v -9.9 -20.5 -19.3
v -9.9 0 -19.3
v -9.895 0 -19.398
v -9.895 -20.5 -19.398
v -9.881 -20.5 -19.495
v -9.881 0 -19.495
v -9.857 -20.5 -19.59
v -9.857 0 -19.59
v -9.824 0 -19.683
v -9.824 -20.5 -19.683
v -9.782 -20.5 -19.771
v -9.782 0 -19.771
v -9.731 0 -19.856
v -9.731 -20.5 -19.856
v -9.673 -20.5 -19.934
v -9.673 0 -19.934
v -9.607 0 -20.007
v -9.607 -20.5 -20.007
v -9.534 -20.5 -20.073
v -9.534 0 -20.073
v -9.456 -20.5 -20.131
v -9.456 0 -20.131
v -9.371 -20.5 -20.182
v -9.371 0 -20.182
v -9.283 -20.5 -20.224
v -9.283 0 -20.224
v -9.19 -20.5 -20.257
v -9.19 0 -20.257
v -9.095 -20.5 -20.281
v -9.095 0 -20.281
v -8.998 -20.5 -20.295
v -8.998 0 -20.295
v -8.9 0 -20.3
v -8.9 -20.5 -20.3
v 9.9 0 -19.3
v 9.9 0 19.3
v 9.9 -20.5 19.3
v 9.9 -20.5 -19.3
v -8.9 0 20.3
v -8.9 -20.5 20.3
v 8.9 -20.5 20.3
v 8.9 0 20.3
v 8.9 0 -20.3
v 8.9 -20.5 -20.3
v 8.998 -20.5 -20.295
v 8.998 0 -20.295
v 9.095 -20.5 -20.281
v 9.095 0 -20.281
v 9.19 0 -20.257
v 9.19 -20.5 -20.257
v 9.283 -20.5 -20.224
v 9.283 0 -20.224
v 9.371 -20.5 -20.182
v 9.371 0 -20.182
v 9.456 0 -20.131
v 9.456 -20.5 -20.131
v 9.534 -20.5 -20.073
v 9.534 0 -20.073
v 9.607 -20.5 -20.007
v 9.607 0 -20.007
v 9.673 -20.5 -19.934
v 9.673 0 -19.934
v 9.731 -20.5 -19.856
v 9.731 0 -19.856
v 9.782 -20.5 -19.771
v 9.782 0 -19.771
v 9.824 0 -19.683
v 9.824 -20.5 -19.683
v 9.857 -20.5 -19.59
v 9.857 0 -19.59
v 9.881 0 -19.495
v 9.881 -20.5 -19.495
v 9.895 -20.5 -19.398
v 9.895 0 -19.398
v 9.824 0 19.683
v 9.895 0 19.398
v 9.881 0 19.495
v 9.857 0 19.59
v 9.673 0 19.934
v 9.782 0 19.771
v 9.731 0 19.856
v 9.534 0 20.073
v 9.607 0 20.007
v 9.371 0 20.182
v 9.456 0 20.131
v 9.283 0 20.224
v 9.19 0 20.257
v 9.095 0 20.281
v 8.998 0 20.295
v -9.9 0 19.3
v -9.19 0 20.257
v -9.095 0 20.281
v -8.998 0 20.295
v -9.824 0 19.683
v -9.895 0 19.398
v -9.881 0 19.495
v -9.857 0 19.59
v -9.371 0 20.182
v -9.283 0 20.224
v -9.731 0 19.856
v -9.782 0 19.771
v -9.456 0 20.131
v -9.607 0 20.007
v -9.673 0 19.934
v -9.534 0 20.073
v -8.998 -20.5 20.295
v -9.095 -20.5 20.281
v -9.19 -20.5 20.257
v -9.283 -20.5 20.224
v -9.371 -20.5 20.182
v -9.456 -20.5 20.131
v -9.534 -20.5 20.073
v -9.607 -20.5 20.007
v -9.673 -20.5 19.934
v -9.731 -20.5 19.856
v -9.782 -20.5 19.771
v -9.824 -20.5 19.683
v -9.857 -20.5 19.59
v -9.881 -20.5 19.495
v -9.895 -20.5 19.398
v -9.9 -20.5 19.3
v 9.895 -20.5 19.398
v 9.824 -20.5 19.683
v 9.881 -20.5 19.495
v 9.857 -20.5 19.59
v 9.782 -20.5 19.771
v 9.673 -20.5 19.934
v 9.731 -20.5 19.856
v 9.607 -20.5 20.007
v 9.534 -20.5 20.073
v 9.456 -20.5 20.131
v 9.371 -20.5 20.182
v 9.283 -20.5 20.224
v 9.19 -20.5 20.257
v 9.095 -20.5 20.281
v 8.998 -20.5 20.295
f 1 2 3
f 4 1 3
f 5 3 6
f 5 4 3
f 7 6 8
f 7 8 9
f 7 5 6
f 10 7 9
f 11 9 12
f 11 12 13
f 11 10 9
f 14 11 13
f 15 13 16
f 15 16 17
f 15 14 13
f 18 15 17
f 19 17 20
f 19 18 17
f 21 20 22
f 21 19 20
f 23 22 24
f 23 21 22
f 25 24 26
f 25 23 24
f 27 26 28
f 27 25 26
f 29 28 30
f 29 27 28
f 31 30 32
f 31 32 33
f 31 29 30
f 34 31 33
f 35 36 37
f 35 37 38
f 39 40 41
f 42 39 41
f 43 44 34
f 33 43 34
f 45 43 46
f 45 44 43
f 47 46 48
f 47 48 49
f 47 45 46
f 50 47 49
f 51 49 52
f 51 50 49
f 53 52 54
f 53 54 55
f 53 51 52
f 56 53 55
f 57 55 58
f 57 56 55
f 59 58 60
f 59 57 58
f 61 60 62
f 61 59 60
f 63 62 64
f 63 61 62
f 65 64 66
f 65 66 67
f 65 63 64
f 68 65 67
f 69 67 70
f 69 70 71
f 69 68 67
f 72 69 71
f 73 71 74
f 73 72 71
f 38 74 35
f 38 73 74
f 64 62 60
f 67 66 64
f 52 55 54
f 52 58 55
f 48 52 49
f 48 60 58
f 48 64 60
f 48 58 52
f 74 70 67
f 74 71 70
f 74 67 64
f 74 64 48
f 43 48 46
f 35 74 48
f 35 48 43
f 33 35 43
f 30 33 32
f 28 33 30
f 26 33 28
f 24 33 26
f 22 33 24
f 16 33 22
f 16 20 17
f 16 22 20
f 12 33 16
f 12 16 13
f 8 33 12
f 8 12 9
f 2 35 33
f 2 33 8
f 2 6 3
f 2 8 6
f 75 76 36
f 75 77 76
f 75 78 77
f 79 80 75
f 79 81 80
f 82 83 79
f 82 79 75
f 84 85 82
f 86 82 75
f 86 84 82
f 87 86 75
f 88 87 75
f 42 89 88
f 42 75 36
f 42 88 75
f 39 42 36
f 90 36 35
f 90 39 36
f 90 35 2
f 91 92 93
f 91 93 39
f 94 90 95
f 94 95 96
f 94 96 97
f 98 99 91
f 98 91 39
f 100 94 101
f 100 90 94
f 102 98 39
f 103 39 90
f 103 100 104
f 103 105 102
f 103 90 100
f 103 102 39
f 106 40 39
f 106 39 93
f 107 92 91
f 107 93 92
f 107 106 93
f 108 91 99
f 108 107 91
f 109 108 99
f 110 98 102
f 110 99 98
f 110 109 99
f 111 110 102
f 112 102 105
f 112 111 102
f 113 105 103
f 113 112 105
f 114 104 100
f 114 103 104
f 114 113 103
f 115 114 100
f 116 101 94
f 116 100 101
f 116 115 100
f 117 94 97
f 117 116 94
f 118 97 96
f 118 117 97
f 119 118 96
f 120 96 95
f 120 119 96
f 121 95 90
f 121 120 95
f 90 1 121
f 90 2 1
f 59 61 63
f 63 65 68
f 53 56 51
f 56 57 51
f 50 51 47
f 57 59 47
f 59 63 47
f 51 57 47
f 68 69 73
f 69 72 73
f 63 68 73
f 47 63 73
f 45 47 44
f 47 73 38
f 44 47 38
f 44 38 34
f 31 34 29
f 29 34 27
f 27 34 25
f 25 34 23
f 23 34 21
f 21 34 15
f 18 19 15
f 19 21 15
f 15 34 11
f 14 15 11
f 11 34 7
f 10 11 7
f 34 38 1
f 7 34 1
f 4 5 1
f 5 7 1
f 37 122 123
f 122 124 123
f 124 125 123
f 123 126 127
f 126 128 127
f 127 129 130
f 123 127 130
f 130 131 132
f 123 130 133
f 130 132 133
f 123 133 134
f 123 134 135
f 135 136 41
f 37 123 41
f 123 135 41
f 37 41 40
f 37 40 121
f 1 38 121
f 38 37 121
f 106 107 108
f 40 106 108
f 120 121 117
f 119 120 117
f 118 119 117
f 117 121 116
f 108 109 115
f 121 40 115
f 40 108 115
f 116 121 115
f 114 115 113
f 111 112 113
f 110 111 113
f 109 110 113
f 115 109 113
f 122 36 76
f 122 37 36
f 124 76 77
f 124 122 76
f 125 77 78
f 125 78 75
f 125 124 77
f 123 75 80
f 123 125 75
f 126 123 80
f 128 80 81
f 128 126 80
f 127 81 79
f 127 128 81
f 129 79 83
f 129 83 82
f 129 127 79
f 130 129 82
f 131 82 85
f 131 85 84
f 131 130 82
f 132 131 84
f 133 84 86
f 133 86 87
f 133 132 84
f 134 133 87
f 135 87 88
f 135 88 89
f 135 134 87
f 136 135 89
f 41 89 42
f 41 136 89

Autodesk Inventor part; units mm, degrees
ref_plane "YZ Plane" through (0, 0, 0) normal (1, 0, 0) x (0, 1, 0)
ref_plane "XZ Plane" through (0, 0, 0) normal (0, 1, 0) x (-1, 0, 0)
ref_plane "XY Plane" through (0, 0, 0) normal (0, 0, 1) x (1, 0, 0)
sketch "Boceto1" plane through (0, 0, 0) normal (0, 1, 0) x (-1, 0, 0)
  line L0 (9.9, 20.3) -> (-9.9, 20.3)
  line L1 (-9.9, 20.3) -> (-9.9, -20.3)
  line L2 (-9.9, -20.3) -> (9.9, -20.3)
  line L3 (9.9, -20.3) -> (9.9, 20.3)
  line L4 (9.9, 20.3) -> (-9.9, -20.3) construction
  line L5 (-9.9, 20.3) -> (9.9, -20.3) construction
  point P0 (0, 0)
  dimension "d0" = 19.8
  dimension "d1" = 40.6
extrude "Extrusión1" add sketch "Boceto1" against normal blind 20.5
fillet "Empalme1" radius 1 4 edges at (9.9, -10.25, 20.3) (-9.9, -10.25, 20.3) (9.9, -10.25, -20.3) (-9.9, -10.25, -20.3)
properties part number "Medio" material "Plástico ABS"
